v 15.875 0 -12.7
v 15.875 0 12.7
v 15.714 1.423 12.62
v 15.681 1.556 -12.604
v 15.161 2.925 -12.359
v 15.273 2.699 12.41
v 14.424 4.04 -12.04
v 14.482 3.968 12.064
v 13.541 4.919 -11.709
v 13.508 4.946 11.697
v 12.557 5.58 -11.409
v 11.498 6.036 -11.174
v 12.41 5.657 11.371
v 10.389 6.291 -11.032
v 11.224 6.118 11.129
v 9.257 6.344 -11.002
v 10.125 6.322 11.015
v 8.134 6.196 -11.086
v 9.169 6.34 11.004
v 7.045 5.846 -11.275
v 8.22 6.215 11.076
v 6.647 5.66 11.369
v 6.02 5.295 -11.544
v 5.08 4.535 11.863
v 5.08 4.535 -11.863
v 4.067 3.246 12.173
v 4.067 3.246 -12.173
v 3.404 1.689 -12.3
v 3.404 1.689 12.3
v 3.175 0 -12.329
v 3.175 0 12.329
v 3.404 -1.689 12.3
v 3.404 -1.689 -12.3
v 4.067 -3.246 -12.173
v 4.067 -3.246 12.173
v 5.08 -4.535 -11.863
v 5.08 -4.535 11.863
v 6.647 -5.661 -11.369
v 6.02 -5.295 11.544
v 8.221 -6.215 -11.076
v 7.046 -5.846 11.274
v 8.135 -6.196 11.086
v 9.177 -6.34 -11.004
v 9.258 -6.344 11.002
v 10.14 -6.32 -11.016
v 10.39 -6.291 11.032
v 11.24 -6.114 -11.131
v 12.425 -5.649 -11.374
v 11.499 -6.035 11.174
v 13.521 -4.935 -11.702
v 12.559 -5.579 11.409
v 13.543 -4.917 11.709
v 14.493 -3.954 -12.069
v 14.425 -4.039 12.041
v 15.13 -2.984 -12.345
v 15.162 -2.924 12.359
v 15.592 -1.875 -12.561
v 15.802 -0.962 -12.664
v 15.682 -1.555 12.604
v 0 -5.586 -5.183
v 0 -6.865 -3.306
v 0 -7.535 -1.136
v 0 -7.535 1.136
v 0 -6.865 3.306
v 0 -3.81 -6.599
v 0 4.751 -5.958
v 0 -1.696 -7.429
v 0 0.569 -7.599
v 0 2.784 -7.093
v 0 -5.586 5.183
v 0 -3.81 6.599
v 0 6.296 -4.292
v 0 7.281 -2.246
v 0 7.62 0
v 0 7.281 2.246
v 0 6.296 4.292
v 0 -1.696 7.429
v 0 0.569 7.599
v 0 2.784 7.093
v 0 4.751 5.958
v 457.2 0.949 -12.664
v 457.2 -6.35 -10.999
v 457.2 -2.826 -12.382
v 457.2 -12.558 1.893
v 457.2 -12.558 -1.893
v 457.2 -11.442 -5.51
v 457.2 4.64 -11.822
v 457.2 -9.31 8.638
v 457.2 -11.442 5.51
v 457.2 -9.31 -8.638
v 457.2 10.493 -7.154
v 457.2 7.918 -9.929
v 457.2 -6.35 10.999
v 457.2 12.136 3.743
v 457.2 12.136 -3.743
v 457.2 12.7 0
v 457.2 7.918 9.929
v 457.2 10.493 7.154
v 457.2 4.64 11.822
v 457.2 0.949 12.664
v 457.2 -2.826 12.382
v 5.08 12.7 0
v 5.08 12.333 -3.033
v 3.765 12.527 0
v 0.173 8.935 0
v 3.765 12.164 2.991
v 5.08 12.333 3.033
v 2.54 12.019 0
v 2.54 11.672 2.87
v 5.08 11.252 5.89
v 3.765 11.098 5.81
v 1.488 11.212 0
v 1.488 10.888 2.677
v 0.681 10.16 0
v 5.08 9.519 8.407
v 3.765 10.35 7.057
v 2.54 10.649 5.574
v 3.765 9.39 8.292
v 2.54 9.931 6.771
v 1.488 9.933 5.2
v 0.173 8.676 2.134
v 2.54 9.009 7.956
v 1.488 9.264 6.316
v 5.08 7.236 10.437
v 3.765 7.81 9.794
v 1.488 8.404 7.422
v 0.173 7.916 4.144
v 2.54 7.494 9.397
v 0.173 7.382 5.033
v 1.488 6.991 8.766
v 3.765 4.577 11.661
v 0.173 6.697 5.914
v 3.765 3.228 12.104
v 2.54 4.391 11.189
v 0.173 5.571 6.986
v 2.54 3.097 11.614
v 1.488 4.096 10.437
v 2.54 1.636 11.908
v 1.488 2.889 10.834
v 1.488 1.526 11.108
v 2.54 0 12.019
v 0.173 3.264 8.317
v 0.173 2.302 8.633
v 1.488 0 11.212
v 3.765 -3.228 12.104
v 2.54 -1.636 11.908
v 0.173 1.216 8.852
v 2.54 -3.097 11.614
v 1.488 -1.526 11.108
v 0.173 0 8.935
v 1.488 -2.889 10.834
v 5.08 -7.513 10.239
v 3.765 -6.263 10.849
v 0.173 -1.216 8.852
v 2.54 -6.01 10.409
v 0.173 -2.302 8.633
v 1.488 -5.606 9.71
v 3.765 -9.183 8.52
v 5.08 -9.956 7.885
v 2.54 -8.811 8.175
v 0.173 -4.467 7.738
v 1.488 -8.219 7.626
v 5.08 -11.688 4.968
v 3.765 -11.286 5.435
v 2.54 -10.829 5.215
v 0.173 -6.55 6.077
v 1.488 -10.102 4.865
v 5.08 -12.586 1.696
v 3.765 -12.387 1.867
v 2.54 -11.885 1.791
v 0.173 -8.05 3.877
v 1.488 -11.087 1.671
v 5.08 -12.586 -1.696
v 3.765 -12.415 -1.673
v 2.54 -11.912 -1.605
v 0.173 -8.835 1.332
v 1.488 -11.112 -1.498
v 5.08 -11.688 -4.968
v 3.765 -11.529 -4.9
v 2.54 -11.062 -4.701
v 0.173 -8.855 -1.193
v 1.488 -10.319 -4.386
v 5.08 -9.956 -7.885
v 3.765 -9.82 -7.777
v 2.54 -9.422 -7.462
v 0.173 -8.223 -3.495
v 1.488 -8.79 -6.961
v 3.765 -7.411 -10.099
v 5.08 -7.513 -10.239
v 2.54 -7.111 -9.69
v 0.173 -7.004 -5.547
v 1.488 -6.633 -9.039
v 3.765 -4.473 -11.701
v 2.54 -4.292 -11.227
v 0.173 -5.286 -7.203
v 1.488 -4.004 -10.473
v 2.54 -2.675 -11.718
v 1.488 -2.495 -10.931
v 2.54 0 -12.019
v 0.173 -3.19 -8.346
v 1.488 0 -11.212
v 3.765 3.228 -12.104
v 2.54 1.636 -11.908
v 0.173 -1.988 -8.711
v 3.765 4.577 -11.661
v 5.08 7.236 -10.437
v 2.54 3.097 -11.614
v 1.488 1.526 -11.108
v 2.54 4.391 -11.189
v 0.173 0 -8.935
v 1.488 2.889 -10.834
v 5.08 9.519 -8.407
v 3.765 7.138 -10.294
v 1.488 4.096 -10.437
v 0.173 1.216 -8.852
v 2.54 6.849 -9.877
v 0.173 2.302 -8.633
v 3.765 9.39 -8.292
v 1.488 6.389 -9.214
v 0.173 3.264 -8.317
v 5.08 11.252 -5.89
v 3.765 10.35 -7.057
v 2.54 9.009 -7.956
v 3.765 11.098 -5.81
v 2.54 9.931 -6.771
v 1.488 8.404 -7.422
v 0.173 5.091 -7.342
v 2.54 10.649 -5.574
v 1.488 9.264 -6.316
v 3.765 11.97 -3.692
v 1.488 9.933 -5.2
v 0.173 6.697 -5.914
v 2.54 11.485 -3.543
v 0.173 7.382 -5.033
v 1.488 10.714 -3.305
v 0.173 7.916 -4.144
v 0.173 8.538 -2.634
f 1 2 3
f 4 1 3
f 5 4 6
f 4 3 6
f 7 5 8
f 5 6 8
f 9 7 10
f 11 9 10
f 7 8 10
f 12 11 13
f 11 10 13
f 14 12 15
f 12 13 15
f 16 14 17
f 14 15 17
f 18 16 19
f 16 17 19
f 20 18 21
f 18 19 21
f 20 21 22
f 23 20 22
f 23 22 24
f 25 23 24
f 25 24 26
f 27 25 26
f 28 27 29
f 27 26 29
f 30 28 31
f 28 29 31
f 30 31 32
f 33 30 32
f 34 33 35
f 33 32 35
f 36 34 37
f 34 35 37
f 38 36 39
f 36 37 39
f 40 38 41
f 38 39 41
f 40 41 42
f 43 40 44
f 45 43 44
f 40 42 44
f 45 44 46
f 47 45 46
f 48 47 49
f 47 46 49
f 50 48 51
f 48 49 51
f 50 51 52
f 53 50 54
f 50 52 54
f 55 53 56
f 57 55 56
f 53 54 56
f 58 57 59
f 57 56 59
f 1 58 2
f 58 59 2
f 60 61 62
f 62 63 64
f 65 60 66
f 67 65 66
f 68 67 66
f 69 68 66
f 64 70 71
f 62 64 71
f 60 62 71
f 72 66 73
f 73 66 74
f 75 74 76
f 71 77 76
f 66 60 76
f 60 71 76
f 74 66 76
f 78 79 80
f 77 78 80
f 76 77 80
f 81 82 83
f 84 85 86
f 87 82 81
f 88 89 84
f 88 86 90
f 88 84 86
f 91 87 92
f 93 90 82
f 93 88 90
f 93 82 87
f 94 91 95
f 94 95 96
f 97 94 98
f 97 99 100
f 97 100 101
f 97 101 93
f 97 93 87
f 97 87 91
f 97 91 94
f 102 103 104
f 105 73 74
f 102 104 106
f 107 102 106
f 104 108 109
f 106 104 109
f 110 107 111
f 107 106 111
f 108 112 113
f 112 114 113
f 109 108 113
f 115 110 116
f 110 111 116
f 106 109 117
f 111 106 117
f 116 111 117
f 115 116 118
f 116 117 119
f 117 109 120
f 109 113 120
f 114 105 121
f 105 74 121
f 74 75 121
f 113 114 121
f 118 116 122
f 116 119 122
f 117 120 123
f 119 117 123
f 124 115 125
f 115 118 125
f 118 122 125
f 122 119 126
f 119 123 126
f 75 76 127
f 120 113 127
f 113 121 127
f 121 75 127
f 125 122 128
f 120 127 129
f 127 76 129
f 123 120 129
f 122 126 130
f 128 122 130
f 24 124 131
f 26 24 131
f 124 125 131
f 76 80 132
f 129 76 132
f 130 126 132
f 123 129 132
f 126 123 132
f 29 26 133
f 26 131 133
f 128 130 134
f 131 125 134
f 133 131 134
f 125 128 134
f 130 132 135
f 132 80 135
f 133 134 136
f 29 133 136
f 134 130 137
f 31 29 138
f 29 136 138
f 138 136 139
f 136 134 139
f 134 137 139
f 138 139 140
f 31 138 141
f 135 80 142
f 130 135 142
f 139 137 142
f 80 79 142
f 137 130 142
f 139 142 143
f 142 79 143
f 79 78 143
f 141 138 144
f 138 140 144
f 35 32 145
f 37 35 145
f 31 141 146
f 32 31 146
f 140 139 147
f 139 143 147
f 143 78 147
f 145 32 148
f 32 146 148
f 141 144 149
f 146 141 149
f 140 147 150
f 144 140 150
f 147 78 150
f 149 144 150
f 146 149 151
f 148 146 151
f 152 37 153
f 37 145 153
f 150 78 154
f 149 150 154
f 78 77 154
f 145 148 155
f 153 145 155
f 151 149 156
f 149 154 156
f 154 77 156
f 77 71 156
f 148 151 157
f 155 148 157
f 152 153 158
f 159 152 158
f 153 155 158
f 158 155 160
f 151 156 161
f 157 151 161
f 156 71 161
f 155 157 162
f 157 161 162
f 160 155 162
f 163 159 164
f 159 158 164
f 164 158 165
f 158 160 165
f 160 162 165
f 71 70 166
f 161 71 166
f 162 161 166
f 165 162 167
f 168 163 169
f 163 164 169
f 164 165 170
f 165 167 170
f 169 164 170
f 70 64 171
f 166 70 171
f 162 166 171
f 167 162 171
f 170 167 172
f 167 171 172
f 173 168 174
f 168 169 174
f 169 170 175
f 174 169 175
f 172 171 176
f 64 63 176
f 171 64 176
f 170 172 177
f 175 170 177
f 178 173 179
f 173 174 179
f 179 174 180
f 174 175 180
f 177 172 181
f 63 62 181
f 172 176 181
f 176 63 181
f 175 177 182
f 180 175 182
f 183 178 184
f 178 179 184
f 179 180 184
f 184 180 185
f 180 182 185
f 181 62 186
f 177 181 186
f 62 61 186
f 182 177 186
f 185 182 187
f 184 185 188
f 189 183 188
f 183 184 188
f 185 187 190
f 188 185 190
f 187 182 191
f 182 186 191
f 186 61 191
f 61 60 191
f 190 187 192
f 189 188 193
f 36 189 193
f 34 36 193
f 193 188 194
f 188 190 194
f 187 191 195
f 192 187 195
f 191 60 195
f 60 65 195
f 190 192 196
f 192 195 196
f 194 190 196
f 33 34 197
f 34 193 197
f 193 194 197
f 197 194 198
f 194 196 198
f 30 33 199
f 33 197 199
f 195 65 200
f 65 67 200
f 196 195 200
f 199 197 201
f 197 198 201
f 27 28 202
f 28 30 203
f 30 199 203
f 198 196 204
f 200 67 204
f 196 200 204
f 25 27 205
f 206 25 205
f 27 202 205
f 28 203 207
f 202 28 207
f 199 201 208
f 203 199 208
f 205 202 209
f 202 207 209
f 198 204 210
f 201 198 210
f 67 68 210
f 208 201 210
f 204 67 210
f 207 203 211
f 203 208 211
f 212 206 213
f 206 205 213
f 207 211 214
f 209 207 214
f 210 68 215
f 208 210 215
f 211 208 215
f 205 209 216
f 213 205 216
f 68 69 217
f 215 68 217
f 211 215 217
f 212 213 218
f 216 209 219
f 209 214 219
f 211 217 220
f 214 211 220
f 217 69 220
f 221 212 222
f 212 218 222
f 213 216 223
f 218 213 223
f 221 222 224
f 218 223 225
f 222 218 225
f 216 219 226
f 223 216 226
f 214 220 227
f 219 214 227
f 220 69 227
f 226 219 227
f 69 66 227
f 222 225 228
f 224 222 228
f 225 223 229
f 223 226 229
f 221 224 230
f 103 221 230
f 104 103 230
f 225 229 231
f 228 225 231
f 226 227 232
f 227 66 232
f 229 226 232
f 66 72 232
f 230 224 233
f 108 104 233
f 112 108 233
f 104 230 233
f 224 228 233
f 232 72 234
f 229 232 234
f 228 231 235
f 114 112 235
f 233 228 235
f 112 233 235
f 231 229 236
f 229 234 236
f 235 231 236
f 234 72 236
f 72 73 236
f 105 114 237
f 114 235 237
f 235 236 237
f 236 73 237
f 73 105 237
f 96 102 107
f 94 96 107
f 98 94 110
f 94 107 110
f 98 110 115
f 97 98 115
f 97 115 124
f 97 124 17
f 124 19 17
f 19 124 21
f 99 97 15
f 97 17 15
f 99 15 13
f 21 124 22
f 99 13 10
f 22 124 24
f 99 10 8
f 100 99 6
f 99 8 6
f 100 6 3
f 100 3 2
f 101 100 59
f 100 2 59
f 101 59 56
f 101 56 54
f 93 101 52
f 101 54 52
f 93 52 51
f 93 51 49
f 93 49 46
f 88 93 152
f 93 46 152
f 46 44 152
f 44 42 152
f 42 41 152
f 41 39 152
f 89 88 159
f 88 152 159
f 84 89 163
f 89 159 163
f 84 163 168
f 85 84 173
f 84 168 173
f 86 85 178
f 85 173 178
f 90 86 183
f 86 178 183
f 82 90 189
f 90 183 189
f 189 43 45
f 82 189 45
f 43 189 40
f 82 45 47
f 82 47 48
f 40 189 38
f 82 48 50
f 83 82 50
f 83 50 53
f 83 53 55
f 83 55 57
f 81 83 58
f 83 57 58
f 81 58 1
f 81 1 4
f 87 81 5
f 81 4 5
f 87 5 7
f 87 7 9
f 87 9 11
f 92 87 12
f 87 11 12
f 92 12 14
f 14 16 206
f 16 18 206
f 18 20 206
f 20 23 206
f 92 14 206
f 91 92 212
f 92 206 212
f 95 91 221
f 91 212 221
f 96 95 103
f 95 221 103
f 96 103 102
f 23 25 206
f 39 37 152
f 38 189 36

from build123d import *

# Parameters (mm, degrees)
F0_R     = 12.7
F1_DEPTH = 457.2
F2_R     = 6.35
F3_DEPTH = 12.7


# Not quite as in the source:
# - a fillet or chamfer that OpenCascade refuses, or shapes differently, is made with other operations: its cross-section is extruded or revolved along the edge and cut away or added


with BuildPart() as f1:
    # F0 (on Right) → F1 (new body)
    with BuildSketch(Plane.YZ):
        Circle(F0_R)
    extrude(amount=F1_DEPTH)

    # F2 (on Top) → F3 (cut, symmetric)
    with BuildSketch(Plane.XY):
        with Locations((9.525, 0)):
            Circle(F2_R)
    extrude(amount=F3_DEPTH, both=True, mode=Mode.SUBTRACT)

    # F4: fillet of radius 5.08 on 1 edges, made by hand

    # F4_s1 → F4_t2 (revolve, cut)
    with BuildSketch(Plane.XY):
        with BuildLine():
            ThreePointArc((5.08, 12.7), (1.4878975516, 11.2121024484), (0, 7.62))
            Line((0, 7.62), (0, 12.7))
            Line((0, 12.7), (5.08, 12.7))
        make_face()
    revolve(axis=Axis((0, 0, 0), (1, 0, 0)), mode=Mode.SUBTRACT)


solid = f1.part
